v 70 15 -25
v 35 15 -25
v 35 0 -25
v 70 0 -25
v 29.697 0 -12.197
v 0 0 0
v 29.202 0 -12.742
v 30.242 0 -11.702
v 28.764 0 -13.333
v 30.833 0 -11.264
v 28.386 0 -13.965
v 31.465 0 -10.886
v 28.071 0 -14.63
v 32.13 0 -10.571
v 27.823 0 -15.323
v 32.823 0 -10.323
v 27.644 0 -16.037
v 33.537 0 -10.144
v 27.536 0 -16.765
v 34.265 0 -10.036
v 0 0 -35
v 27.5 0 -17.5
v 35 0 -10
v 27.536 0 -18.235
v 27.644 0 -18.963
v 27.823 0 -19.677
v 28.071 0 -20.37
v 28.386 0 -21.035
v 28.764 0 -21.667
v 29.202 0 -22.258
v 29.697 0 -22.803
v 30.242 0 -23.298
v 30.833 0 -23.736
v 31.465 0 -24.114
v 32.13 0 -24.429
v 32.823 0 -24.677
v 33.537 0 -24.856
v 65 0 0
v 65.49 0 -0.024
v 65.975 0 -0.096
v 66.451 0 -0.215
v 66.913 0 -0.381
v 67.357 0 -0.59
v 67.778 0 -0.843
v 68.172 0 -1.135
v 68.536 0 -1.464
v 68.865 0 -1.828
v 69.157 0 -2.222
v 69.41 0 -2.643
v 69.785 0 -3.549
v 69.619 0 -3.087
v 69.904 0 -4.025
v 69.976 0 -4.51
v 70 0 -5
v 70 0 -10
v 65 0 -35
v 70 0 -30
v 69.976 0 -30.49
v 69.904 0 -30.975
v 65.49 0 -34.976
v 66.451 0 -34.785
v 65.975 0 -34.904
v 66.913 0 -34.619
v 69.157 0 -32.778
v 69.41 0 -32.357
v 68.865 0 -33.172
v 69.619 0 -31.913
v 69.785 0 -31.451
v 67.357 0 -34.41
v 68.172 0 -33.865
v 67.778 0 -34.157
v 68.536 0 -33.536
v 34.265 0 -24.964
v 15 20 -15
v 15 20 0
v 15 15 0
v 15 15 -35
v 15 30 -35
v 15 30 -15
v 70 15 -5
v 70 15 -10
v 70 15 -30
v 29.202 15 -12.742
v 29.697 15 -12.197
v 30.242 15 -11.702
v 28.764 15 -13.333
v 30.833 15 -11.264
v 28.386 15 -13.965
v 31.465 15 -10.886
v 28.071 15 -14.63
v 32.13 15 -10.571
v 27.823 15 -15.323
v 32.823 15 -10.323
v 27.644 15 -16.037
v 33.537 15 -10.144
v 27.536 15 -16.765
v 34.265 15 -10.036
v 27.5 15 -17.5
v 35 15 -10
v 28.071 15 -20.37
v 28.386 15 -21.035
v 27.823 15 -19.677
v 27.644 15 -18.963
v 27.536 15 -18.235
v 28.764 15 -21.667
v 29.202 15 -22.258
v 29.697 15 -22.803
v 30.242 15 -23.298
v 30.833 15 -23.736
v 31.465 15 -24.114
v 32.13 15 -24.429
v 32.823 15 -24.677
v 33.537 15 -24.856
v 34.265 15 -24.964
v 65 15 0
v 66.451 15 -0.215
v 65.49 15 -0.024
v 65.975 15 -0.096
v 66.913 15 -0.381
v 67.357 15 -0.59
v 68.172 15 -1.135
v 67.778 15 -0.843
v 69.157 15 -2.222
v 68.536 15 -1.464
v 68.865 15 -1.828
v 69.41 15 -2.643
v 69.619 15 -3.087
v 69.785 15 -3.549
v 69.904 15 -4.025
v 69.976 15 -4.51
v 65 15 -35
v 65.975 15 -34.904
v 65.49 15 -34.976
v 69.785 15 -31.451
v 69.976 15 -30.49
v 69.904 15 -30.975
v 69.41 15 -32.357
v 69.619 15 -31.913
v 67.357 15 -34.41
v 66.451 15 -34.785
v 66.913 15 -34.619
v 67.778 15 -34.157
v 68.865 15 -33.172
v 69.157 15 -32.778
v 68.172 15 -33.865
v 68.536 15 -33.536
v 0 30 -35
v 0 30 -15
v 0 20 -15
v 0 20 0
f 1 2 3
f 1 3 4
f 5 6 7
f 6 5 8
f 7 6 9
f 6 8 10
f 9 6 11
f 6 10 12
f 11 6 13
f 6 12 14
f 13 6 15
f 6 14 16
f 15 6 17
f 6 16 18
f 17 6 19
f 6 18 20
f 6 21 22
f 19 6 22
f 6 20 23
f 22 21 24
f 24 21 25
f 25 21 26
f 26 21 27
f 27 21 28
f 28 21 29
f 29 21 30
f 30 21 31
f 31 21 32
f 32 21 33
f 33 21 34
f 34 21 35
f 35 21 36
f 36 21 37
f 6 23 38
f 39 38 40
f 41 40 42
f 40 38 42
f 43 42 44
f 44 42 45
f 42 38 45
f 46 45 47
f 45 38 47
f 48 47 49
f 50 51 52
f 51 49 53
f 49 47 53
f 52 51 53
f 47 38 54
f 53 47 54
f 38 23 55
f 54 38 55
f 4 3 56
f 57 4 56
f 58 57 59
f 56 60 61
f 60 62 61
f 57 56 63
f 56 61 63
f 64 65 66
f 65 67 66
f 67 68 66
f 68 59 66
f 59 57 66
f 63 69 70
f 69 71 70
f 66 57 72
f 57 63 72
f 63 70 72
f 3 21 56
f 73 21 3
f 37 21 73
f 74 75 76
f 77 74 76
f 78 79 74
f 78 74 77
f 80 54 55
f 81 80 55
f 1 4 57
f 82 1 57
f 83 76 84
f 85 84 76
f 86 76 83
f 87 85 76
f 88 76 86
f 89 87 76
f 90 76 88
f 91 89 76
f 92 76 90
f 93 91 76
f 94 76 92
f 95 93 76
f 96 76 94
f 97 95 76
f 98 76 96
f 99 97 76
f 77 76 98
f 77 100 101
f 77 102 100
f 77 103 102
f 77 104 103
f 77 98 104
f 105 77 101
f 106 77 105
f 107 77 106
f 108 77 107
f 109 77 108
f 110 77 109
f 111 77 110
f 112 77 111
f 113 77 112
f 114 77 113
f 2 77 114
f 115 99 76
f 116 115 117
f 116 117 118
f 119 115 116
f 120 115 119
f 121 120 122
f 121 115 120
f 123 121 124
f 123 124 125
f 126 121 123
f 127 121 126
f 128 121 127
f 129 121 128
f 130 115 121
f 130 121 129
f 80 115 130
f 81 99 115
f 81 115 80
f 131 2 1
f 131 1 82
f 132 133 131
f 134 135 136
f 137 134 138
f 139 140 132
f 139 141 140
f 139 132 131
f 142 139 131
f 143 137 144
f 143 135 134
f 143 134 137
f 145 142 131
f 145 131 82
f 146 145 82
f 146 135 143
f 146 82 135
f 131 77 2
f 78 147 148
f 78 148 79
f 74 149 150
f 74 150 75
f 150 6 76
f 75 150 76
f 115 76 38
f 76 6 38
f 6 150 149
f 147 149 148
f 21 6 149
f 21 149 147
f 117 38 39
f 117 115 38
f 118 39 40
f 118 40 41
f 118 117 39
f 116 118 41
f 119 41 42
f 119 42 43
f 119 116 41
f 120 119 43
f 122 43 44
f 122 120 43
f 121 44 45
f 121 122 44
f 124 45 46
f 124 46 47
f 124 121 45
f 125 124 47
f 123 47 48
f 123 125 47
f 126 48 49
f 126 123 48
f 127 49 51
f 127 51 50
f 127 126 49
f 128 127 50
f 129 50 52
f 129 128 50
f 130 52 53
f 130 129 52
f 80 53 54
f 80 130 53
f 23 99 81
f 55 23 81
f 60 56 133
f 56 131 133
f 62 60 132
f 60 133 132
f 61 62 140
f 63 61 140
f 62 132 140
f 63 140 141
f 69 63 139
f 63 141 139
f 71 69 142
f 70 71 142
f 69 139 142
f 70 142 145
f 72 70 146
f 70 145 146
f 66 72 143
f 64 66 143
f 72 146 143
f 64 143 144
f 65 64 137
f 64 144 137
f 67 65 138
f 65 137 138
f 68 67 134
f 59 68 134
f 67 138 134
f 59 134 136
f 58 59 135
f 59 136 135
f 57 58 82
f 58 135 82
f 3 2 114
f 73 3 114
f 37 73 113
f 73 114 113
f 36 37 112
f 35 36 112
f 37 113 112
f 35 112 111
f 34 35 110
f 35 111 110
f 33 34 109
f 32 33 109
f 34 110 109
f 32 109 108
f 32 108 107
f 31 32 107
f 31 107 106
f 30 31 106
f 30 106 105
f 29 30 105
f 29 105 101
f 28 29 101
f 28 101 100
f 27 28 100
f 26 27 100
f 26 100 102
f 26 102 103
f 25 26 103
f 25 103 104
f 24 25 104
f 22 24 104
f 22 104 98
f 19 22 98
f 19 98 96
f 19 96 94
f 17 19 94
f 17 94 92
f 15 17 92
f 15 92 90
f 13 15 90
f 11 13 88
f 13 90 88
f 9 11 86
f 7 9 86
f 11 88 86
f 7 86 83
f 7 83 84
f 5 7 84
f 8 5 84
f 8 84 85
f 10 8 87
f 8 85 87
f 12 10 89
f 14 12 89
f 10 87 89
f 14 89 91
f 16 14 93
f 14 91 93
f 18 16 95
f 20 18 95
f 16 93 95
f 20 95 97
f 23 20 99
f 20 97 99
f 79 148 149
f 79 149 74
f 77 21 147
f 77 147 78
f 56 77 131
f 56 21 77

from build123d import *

# Parameters (mm, degrees)
SKETCH1_W           = 70
SKETCH1_H           = 35
BOSS_EXTRUDE1_DEPTH = 30
SKETCH2_W           = 55
SKETCH2_H           = 35
CUT_EXTRUDE1_DEPTH  = 15
SKETCH3_W           = 15
SKETCH3_H           = 15
CUT_EXTRUDE2_DEPTH  = 10
FILLET1_R           = 5
SKETCH4_W           = 35
SKETCH4_H           = 15
CUT_EXTRUDE3_DEPTH  = 16
SKETCH5_R           = 7.5
CUT_EXTRUDE4_DEPTH  = 16


with BuildPart() as part:
    # Sketch1 → Boss-Extrude1 (new body)
    with BuildSketch(Plane(origin=(0, 0, 0), x_dir=(1, 0, 0), z_dir=(0, 1, 0))):
        with Locations((35, 17.5)):
            Rectangle(SKETCH1_W, SKETCH1_H)
    extrude(amount=BOSS_EXTRUDE1_DEPTH)

    # Sketch2 → Cut-Extrude1 (cut)
    with BuildSketch(Plane(origin=(0, 30, 0), x_dir=(1, 0, 0), z_dir=(0, 1, 0))):
        with Locations((42.5, 17.5)):
            Rectangle(SKETCH2_W, SKETCH2_H)
    extrude(amount=-CUT_EXTRUDE1_DEPTH, mode=Mode.SUBTRACT)

    # Sketch3 → Cut-Extrude2 (cut)
    with BuildSketch(Plane(origin=(0, 30, 0), x_dir=(1, 0, 0), z_dir=(0, 1, 0))):
        with Locations((7.5, 7.5)):
            Rectangle(SKETCH3_W, SKETCH3_H)
    extrude(amount=-CUT_EXTRUDE2_DEPTH, mode=Mode.SUBTRACT)

    # Fillet1
    fillet1_edges = [part.edges().sort_by_distance(p)[0] for p in [
        (70, 7.5, -35),
        (70, 7.5, 0),
    ]]
    fillet(fillet1_edges, radius=FILLET1_R)

    # Sketch4 → Cut-Extrude3 (cut, through all)
    with BuildSketch(Plane(origin=(0, 15, 0), x_dir=(1, 0, 0), z_dir=(0, 1, 0))):
        with Locations((52.5, 17.5)):
            Rectangle(SKETCH4_W, SKETCH4_H)
    extrude(amount=-CUT_EXTRUDE3_DEPTH, mode=Mode.SUBTRACT)

    # Sketch5 → Cut-Extrude4 (cut, through all)
    with BuildSketch(Plane(origin=(0, 15, 0), x_dir=(1, 0, 0), z_dir=(0, 1, 0))):
        with Locations((35, 17.5)):
            Circle(SKETCH5_R)
    extrude(amount=-CUT_EXTRUDE4_DEPTH, mode=Mode.SUBTRACT)


solid = part.part
